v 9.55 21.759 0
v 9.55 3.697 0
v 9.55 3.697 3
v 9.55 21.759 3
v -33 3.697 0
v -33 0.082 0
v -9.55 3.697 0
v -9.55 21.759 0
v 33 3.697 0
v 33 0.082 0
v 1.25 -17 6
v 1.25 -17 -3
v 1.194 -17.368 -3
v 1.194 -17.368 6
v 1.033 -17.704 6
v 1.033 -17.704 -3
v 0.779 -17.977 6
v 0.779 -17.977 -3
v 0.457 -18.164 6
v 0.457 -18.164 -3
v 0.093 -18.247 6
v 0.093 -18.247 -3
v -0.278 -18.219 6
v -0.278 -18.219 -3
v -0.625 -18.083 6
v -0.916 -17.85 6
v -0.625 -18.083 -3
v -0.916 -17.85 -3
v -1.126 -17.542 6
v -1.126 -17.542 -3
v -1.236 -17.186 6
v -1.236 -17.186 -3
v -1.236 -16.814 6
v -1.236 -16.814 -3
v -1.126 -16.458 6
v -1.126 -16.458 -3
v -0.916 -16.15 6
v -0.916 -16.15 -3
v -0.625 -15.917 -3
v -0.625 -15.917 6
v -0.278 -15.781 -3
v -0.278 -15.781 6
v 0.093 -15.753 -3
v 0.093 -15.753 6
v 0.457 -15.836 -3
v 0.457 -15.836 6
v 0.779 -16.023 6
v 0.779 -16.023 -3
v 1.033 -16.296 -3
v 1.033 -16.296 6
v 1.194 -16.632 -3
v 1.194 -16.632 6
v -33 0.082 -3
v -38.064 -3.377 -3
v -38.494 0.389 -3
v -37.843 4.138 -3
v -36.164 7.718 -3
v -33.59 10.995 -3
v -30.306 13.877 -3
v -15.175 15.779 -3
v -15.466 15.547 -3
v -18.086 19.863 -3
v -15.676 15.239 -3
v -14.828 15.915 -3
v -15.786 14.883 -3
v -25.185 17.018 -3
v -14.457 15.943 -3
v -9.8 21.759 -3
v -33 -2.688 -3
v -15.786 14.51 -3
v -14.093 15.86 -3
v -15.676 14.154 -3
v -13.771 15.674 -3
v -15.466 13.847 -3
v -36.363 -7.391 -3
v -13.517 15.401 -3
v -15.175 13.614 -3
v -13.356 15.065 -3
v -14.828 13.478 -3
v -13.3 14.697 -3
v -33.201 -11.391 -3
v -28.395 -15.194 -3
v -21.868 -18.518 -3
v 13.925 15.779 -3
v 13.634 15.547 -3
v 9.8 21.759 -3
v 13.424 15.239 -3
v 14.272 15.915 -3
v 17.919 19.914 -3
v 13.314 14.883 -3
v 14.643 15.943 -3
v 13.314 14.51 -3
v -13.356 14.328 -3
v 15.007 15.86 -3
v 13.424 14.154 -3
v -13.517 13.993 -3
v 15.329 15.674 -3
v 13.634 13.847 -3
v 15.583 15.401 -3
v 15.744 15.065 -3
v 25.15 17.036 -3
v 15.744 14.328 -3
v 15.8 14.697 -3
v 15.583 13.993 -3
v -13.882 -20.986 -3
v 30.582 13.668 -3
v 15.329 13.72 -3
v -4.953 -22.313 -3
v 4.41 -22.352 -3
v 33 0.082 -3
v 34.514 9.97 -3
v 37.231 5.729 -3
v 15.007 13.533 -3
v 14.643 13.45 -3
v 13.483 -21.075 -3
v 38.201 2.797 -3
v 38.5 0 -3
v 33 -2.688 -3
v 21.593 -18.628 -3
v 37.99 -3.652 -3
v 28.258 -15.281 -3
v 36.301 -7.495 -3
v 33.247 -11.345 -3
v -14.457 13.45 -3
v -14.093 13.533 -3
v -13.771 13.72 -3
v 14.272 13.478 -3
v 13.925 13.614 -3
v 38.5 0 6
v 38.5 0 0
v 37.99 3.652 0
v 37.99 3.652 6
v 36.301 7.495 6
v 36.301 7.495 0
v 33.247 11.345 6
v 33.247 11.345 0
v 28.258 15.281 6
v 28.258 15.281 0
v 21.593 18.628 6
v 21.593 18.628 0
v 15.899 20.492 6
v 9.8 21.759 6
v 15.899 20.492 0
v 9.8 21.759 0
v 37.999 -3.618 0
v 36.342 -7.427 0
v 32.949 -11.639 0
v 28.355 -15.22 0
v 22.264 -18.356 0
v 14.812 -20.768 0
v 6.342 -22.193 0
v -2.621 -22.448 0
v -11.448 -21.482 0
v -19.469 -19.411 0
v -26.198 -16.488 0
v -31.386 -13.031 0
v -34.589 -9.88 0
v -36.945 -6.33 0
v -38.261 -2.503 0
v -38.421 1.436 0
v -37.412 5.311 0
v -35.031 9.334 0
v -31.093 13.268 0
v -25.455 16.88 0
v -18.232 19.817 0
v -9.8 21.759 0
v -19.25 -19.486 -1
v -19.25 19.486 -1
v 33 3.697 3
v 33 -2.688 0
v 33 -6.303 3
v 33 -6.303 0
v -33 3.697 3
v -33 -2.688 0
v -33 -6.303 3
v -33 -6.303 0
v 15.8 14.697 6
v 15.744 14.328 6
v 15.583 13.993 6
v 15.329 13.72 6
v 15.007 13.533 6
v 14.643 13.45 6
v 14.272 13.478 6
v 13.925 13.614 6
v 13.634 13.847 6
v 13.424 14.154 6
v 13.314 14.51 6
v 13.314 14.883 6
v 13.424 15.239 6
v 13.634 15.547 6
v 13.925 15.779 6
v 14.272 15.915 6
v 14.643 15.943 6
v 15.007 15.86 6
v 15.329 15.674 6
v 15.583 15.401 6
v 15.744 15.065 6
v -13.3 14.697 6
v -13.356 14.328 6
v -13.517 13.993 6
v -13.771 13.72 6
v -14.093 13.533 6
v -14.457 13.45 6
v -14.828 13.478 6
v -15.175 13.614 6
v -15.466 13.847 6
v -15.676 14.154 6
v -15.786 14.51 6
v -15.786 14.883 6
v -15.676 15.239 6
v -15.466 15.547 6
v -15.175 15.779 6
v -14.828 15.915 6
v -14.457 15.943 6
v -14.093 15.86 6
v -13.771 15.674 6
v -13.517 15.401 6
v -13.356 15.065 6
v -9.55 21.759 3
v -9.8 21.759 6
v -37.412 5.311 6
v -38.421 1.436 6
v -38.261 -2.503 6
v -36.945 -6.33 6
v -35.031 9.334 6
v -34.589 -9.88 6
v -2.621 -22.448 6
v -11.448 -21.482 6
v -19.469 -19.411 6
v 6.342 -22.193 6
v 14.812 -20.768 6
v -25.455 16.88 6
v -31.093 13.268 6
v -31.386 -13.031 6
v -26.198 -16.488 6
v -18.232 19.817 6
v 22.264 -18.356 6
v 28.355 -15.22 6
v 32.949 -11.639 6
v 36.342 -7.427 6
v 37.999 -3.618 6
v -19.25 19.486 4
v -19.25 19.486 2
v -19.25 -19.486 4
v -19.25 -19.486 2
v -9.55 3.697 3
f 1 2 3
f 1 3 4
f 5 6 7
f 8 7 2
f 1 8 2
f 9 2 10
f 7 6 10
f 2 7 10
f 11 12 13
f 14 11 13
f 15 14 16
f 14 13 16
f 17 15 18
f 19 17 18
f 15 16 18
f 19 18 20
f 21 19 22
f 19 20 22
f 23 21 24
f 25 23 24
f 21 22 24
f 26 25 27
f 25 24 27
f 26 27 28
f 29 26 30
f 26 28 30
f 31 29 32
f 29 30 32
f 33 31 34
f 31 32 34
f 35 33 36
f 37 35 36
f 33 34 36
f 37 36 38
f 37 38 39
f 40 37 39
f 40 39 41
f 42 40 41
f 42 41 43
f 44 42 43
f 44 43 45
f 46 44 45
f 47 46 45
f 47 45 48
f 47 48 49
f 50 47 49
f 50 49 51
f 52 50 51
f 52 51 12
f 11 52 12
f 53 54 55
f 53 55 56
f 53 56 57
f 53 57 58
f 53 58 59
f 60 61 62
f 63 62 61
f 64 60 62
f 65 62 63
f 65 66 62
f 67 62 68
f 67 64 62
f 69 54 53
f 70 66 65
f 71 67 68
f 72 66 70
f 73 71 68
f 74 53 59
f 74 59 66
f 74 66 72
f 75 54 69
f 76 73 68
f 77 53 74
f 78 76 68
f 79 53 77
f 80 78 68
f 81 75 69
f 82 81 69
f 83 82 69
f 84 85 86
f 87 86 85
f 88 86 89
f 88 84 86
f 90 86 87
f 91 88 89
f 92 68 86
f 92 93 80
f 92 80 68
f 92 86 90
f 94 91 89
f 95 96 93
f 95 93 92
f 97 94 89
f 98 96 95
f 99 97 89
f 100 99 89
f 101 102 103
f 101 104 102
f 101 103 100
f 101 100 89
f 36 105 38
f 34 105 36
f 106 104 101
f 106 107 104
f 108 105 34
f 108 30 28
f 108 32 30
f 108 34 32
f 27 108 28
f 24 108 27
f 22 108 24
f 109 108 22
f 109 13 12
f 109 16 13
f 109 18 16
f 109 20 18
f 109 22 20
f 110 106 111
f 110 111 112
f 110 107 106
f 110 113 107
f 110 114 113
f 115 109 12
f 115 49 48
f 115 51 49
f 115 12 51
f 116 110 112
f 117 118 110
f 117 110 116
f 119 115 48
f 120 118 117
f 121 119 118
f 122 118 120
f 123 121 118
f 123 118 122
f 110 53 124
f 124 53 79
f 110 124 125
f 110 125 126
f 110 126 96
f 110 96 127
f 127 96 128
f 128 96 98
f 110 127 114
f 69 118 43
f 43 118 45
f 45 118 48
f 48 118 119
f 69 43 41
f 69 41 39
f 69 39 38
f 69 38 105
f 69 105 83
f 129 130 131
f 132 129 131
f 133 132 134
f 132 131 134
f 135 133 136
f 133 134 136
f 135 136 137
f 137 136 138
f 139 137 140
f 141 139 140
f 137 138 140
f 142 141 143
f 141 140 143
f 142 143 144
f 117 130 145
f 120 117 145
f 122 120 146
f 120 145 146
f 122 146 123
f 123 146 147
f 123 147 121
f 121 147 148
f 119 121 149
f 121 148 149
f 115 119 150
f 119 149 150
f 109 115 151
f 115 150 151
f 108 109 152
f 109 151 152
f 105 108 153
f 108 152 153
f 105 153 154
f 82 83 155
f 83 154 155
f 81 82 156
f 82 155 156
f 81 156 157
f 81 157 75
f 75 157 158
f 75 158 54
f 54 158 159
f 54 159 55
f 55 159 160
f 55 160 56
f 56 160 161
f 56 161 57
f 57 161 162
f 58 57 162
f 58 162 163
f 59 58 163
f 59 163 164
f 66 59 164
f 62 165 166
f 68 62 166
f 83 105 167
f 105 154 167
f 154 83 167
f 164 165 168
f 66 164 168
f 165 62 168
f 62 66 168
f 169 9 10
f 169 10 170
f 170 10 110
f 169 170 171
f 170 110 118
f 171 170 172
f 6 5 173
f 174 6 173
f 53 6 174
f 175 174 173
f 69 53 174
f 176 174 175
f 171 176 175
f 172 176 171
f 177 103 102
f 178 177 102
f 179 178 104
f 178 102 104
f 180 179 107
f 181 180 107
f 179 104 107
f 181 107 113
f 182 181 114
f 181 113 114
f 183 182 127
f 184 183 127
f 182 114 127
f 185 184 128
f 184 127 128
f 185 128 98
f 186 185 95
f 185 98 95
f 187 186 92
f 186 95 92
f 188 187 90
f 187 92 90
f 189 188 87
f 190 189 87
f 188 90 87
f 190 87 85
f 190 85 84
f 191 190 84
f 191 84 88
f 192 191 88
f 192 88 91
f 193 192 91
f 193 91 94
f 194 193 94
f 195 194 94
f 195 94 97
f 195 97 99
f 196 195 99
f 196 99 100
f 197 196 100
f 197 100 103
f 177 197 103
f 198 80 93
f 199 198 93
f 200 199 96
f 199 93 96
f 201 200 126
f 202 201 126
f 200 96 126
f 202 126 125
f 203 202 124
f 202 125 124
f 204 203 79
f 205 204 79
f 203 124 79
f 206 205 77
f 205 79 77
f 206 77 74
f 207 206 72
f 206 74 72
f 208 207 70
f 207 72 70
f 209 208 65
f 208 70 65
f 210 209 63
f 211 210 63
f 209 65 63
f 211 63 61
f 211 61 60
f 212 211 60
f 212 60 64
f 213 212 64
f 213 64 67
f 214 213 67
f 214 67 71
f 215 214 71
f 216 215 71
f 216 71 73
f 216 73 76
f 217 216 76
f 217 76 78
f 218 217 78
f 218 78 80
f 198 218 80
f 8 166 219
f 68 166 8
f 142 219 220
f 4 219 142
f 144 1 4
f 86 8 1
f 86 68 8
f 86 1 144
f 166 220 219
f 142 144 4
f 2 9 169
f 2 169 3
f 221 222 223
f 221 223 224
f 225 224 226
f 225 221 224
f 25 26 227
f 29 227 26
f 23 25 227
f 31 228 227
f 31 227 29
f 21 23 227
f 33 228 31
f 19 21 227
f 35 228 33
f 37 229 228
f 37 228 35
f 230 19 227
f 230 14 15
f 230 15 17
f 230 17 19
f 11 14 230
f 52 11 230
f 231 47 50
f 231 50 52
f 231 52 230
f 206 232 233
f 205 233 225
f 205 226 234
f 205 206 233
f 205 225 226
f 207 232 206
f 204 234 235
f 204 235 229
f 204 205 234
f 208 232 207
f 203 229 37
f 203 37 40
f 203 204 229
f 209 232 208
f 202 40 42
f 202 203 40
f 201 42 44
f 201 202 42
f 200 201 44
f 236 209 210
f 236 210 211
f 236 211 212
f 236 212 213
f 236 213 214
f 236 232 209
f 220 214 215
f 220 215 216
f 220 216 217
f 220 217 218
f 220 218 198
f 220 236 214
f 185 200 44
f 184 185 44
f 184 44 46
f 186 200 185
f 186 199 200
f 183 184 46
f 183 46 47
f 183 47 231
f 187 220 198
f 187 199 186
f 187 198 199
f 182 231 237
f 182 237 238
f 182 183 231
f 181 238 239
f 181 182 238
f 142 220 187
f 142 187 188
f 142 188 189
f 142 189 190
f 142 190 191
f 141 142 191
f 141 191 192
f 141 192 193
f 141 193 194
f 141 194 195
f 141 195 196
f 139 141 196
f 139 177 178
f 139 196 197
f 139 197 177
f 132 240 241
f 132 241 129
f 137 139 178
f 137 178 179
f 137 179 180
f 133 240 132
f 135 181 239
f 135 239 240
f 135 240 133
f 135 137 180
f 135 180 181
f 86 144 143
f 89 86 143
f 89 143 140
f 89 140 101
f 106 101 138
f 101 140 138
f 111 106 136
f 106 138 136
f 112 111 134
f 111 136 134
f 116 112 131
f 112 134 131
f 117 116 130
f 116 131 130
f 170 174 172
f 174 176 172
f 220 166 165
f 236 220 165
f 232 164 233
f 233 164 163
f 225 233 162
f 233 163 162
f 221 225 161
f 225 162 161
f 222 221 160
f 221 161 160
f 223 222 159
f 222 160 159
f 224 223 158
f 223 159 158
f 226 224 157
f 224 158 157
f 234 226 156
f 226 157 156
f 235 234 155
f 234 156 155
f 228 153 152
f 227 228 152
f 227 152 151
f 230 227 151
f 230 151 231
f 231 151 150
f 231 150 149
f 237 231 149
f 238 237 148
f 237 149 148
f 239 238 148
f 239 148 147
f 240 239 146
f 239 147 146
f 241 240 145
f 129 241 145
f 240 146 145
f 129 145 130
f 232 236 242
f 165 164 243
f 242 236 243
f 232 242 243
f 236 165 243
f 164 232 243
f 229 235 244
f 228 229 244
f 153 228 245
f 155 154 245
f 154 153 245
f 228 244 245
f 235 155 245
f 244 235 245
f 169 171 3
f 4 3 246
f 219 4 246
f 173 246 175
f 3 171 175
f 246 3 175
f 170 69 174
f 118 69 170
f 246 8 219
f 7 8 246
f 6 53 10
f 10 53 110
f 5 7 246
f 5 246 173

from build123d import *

# Parameters (mm, degrees)
PAD_DEPTH       = 6
POCKET_DEPTH    = 3
PAD001_DEPTH    = 3
SKETCH003_W     = 66
SKETCH003_H     = 2.77
POCKET001_DEPTH = 3
SKETCH004_W     = 19.6
SKETCH004_H     = 1
POCKET002_DEPTH = 9.001
SKETCH005_R     = 1.25
POCKET003_DEPTH = 9.001


with BuildPart() as part:
    # Sketch → Pad (new body)
    with BuildSketch(Plane.XY):
        with BuildLine():
            add(Edge.make_bspline(
                [(38.5, 0), (38.5, 38.971143), (-19.25, 19.485572), (-77, 0), (-19.25, -19.485572), (38.5, -38.971143), (38.5, 0)],
                knots=[0, 0, 0, 2.094395, 2.094395, 4.18879, 4.18879, 6.283185, 6.283185, 6.283185], degree=2, weights=[1, 0.5, 1, 0.5, 1, 0.5, 1]))
        make_face()
    extrude(amount=PAD_DEPTH)

    # Sketch001 (on Face2 of Pad) → Pocket (cut)
    with BuildSketch(Plane(origin=(0, 0, 0), x_dir=(1, 0, 0), z_dir=(0, 0, -1))):
        Polygon((9.55, -3.696801), (9.55, -21.796801), (-9.55, -21.796801), (-9.55, -3.696801), (-33, -3.696801), (-33, 6.303199), (33, 6.303199), (33, -3.696801), align=None)
    extrude(amount=-POCKET_DEPTH, mode=Mode.SUBTRACT)

    # Sketch002 (on Face2 of Pocket) → Pad001 (join)
    with BuildSketch(Plane(origin=(0, 0, 0), x_dir=(1, 0, 0), z_dir=(0, 0, -1))):
        with BuildLine():
            add(Edge.make_bspline(
                [(38.5, 0), (38.5, 38.971143), (-19.25, 19.485572), (-77, 0), (-19.25, -19.485572), (38.5, -38.971143), (38.5, 0)],
                knots=[0, 0, 0, 2.094395, 2.094395, 4.18879, 4.18879, 6.283185, 6.283185, 6.283185], degree=2, weights=[1, 0.5, 1, 0.5, 1, 0.5, 1]))
        make_face()
    extrude(amount=PAD001_DEPTH)

    # Sketch003 (on Face4 of Pad001) → Pocket001 (cut)
    with BuildSketch(Plane(origin=(0, 0, -3), x_dir=(1, 0, 0), z_dir=(0, 0, -1))):
        with Locations((0, 1.303199)):
            Rectangle(SKETCH003_W, SKETCH003_H)
    extrude(amount=-POCKET001_DEPTH, mode=Mode.SUBTRACT)

    # Sketch004 (on Face4 of Pocket001) → Pocket002 (cut, through all)
    with BuildSketch(Plane(origin=(0, 0, -3), x_dir=(1, 0, 0), z_dir=(0, 0, -1))):
        with Locations((0, -22.258868)):
            Rectangle(SKETCH004_W, SKETCH004_H)
    extrude(amount=-POCKET002_DEPTH, mode=Mode.SUBTRACT)

    # Sketch005 (on Face7 of Pocket002) → Pocket003 (cut, through all)
    with BuildSketch(Plane(origin=(0, 0, -3), x_dir=(1, 0, 0), z_dir=(0, 0, -1))):
        with Locations((-14.55, -14.696801)):
            Circle(SKETCH005_R)
        with Locations((0, 17)):
            Circle(SKETCH005_R)
        with Locations((14.55, -14.696801)):
            Circle(SKETCH005_R)
    extrude(amount=-POCKET003_DEPTH, mode=Mode.SUBTRACT)


solid = part.part
